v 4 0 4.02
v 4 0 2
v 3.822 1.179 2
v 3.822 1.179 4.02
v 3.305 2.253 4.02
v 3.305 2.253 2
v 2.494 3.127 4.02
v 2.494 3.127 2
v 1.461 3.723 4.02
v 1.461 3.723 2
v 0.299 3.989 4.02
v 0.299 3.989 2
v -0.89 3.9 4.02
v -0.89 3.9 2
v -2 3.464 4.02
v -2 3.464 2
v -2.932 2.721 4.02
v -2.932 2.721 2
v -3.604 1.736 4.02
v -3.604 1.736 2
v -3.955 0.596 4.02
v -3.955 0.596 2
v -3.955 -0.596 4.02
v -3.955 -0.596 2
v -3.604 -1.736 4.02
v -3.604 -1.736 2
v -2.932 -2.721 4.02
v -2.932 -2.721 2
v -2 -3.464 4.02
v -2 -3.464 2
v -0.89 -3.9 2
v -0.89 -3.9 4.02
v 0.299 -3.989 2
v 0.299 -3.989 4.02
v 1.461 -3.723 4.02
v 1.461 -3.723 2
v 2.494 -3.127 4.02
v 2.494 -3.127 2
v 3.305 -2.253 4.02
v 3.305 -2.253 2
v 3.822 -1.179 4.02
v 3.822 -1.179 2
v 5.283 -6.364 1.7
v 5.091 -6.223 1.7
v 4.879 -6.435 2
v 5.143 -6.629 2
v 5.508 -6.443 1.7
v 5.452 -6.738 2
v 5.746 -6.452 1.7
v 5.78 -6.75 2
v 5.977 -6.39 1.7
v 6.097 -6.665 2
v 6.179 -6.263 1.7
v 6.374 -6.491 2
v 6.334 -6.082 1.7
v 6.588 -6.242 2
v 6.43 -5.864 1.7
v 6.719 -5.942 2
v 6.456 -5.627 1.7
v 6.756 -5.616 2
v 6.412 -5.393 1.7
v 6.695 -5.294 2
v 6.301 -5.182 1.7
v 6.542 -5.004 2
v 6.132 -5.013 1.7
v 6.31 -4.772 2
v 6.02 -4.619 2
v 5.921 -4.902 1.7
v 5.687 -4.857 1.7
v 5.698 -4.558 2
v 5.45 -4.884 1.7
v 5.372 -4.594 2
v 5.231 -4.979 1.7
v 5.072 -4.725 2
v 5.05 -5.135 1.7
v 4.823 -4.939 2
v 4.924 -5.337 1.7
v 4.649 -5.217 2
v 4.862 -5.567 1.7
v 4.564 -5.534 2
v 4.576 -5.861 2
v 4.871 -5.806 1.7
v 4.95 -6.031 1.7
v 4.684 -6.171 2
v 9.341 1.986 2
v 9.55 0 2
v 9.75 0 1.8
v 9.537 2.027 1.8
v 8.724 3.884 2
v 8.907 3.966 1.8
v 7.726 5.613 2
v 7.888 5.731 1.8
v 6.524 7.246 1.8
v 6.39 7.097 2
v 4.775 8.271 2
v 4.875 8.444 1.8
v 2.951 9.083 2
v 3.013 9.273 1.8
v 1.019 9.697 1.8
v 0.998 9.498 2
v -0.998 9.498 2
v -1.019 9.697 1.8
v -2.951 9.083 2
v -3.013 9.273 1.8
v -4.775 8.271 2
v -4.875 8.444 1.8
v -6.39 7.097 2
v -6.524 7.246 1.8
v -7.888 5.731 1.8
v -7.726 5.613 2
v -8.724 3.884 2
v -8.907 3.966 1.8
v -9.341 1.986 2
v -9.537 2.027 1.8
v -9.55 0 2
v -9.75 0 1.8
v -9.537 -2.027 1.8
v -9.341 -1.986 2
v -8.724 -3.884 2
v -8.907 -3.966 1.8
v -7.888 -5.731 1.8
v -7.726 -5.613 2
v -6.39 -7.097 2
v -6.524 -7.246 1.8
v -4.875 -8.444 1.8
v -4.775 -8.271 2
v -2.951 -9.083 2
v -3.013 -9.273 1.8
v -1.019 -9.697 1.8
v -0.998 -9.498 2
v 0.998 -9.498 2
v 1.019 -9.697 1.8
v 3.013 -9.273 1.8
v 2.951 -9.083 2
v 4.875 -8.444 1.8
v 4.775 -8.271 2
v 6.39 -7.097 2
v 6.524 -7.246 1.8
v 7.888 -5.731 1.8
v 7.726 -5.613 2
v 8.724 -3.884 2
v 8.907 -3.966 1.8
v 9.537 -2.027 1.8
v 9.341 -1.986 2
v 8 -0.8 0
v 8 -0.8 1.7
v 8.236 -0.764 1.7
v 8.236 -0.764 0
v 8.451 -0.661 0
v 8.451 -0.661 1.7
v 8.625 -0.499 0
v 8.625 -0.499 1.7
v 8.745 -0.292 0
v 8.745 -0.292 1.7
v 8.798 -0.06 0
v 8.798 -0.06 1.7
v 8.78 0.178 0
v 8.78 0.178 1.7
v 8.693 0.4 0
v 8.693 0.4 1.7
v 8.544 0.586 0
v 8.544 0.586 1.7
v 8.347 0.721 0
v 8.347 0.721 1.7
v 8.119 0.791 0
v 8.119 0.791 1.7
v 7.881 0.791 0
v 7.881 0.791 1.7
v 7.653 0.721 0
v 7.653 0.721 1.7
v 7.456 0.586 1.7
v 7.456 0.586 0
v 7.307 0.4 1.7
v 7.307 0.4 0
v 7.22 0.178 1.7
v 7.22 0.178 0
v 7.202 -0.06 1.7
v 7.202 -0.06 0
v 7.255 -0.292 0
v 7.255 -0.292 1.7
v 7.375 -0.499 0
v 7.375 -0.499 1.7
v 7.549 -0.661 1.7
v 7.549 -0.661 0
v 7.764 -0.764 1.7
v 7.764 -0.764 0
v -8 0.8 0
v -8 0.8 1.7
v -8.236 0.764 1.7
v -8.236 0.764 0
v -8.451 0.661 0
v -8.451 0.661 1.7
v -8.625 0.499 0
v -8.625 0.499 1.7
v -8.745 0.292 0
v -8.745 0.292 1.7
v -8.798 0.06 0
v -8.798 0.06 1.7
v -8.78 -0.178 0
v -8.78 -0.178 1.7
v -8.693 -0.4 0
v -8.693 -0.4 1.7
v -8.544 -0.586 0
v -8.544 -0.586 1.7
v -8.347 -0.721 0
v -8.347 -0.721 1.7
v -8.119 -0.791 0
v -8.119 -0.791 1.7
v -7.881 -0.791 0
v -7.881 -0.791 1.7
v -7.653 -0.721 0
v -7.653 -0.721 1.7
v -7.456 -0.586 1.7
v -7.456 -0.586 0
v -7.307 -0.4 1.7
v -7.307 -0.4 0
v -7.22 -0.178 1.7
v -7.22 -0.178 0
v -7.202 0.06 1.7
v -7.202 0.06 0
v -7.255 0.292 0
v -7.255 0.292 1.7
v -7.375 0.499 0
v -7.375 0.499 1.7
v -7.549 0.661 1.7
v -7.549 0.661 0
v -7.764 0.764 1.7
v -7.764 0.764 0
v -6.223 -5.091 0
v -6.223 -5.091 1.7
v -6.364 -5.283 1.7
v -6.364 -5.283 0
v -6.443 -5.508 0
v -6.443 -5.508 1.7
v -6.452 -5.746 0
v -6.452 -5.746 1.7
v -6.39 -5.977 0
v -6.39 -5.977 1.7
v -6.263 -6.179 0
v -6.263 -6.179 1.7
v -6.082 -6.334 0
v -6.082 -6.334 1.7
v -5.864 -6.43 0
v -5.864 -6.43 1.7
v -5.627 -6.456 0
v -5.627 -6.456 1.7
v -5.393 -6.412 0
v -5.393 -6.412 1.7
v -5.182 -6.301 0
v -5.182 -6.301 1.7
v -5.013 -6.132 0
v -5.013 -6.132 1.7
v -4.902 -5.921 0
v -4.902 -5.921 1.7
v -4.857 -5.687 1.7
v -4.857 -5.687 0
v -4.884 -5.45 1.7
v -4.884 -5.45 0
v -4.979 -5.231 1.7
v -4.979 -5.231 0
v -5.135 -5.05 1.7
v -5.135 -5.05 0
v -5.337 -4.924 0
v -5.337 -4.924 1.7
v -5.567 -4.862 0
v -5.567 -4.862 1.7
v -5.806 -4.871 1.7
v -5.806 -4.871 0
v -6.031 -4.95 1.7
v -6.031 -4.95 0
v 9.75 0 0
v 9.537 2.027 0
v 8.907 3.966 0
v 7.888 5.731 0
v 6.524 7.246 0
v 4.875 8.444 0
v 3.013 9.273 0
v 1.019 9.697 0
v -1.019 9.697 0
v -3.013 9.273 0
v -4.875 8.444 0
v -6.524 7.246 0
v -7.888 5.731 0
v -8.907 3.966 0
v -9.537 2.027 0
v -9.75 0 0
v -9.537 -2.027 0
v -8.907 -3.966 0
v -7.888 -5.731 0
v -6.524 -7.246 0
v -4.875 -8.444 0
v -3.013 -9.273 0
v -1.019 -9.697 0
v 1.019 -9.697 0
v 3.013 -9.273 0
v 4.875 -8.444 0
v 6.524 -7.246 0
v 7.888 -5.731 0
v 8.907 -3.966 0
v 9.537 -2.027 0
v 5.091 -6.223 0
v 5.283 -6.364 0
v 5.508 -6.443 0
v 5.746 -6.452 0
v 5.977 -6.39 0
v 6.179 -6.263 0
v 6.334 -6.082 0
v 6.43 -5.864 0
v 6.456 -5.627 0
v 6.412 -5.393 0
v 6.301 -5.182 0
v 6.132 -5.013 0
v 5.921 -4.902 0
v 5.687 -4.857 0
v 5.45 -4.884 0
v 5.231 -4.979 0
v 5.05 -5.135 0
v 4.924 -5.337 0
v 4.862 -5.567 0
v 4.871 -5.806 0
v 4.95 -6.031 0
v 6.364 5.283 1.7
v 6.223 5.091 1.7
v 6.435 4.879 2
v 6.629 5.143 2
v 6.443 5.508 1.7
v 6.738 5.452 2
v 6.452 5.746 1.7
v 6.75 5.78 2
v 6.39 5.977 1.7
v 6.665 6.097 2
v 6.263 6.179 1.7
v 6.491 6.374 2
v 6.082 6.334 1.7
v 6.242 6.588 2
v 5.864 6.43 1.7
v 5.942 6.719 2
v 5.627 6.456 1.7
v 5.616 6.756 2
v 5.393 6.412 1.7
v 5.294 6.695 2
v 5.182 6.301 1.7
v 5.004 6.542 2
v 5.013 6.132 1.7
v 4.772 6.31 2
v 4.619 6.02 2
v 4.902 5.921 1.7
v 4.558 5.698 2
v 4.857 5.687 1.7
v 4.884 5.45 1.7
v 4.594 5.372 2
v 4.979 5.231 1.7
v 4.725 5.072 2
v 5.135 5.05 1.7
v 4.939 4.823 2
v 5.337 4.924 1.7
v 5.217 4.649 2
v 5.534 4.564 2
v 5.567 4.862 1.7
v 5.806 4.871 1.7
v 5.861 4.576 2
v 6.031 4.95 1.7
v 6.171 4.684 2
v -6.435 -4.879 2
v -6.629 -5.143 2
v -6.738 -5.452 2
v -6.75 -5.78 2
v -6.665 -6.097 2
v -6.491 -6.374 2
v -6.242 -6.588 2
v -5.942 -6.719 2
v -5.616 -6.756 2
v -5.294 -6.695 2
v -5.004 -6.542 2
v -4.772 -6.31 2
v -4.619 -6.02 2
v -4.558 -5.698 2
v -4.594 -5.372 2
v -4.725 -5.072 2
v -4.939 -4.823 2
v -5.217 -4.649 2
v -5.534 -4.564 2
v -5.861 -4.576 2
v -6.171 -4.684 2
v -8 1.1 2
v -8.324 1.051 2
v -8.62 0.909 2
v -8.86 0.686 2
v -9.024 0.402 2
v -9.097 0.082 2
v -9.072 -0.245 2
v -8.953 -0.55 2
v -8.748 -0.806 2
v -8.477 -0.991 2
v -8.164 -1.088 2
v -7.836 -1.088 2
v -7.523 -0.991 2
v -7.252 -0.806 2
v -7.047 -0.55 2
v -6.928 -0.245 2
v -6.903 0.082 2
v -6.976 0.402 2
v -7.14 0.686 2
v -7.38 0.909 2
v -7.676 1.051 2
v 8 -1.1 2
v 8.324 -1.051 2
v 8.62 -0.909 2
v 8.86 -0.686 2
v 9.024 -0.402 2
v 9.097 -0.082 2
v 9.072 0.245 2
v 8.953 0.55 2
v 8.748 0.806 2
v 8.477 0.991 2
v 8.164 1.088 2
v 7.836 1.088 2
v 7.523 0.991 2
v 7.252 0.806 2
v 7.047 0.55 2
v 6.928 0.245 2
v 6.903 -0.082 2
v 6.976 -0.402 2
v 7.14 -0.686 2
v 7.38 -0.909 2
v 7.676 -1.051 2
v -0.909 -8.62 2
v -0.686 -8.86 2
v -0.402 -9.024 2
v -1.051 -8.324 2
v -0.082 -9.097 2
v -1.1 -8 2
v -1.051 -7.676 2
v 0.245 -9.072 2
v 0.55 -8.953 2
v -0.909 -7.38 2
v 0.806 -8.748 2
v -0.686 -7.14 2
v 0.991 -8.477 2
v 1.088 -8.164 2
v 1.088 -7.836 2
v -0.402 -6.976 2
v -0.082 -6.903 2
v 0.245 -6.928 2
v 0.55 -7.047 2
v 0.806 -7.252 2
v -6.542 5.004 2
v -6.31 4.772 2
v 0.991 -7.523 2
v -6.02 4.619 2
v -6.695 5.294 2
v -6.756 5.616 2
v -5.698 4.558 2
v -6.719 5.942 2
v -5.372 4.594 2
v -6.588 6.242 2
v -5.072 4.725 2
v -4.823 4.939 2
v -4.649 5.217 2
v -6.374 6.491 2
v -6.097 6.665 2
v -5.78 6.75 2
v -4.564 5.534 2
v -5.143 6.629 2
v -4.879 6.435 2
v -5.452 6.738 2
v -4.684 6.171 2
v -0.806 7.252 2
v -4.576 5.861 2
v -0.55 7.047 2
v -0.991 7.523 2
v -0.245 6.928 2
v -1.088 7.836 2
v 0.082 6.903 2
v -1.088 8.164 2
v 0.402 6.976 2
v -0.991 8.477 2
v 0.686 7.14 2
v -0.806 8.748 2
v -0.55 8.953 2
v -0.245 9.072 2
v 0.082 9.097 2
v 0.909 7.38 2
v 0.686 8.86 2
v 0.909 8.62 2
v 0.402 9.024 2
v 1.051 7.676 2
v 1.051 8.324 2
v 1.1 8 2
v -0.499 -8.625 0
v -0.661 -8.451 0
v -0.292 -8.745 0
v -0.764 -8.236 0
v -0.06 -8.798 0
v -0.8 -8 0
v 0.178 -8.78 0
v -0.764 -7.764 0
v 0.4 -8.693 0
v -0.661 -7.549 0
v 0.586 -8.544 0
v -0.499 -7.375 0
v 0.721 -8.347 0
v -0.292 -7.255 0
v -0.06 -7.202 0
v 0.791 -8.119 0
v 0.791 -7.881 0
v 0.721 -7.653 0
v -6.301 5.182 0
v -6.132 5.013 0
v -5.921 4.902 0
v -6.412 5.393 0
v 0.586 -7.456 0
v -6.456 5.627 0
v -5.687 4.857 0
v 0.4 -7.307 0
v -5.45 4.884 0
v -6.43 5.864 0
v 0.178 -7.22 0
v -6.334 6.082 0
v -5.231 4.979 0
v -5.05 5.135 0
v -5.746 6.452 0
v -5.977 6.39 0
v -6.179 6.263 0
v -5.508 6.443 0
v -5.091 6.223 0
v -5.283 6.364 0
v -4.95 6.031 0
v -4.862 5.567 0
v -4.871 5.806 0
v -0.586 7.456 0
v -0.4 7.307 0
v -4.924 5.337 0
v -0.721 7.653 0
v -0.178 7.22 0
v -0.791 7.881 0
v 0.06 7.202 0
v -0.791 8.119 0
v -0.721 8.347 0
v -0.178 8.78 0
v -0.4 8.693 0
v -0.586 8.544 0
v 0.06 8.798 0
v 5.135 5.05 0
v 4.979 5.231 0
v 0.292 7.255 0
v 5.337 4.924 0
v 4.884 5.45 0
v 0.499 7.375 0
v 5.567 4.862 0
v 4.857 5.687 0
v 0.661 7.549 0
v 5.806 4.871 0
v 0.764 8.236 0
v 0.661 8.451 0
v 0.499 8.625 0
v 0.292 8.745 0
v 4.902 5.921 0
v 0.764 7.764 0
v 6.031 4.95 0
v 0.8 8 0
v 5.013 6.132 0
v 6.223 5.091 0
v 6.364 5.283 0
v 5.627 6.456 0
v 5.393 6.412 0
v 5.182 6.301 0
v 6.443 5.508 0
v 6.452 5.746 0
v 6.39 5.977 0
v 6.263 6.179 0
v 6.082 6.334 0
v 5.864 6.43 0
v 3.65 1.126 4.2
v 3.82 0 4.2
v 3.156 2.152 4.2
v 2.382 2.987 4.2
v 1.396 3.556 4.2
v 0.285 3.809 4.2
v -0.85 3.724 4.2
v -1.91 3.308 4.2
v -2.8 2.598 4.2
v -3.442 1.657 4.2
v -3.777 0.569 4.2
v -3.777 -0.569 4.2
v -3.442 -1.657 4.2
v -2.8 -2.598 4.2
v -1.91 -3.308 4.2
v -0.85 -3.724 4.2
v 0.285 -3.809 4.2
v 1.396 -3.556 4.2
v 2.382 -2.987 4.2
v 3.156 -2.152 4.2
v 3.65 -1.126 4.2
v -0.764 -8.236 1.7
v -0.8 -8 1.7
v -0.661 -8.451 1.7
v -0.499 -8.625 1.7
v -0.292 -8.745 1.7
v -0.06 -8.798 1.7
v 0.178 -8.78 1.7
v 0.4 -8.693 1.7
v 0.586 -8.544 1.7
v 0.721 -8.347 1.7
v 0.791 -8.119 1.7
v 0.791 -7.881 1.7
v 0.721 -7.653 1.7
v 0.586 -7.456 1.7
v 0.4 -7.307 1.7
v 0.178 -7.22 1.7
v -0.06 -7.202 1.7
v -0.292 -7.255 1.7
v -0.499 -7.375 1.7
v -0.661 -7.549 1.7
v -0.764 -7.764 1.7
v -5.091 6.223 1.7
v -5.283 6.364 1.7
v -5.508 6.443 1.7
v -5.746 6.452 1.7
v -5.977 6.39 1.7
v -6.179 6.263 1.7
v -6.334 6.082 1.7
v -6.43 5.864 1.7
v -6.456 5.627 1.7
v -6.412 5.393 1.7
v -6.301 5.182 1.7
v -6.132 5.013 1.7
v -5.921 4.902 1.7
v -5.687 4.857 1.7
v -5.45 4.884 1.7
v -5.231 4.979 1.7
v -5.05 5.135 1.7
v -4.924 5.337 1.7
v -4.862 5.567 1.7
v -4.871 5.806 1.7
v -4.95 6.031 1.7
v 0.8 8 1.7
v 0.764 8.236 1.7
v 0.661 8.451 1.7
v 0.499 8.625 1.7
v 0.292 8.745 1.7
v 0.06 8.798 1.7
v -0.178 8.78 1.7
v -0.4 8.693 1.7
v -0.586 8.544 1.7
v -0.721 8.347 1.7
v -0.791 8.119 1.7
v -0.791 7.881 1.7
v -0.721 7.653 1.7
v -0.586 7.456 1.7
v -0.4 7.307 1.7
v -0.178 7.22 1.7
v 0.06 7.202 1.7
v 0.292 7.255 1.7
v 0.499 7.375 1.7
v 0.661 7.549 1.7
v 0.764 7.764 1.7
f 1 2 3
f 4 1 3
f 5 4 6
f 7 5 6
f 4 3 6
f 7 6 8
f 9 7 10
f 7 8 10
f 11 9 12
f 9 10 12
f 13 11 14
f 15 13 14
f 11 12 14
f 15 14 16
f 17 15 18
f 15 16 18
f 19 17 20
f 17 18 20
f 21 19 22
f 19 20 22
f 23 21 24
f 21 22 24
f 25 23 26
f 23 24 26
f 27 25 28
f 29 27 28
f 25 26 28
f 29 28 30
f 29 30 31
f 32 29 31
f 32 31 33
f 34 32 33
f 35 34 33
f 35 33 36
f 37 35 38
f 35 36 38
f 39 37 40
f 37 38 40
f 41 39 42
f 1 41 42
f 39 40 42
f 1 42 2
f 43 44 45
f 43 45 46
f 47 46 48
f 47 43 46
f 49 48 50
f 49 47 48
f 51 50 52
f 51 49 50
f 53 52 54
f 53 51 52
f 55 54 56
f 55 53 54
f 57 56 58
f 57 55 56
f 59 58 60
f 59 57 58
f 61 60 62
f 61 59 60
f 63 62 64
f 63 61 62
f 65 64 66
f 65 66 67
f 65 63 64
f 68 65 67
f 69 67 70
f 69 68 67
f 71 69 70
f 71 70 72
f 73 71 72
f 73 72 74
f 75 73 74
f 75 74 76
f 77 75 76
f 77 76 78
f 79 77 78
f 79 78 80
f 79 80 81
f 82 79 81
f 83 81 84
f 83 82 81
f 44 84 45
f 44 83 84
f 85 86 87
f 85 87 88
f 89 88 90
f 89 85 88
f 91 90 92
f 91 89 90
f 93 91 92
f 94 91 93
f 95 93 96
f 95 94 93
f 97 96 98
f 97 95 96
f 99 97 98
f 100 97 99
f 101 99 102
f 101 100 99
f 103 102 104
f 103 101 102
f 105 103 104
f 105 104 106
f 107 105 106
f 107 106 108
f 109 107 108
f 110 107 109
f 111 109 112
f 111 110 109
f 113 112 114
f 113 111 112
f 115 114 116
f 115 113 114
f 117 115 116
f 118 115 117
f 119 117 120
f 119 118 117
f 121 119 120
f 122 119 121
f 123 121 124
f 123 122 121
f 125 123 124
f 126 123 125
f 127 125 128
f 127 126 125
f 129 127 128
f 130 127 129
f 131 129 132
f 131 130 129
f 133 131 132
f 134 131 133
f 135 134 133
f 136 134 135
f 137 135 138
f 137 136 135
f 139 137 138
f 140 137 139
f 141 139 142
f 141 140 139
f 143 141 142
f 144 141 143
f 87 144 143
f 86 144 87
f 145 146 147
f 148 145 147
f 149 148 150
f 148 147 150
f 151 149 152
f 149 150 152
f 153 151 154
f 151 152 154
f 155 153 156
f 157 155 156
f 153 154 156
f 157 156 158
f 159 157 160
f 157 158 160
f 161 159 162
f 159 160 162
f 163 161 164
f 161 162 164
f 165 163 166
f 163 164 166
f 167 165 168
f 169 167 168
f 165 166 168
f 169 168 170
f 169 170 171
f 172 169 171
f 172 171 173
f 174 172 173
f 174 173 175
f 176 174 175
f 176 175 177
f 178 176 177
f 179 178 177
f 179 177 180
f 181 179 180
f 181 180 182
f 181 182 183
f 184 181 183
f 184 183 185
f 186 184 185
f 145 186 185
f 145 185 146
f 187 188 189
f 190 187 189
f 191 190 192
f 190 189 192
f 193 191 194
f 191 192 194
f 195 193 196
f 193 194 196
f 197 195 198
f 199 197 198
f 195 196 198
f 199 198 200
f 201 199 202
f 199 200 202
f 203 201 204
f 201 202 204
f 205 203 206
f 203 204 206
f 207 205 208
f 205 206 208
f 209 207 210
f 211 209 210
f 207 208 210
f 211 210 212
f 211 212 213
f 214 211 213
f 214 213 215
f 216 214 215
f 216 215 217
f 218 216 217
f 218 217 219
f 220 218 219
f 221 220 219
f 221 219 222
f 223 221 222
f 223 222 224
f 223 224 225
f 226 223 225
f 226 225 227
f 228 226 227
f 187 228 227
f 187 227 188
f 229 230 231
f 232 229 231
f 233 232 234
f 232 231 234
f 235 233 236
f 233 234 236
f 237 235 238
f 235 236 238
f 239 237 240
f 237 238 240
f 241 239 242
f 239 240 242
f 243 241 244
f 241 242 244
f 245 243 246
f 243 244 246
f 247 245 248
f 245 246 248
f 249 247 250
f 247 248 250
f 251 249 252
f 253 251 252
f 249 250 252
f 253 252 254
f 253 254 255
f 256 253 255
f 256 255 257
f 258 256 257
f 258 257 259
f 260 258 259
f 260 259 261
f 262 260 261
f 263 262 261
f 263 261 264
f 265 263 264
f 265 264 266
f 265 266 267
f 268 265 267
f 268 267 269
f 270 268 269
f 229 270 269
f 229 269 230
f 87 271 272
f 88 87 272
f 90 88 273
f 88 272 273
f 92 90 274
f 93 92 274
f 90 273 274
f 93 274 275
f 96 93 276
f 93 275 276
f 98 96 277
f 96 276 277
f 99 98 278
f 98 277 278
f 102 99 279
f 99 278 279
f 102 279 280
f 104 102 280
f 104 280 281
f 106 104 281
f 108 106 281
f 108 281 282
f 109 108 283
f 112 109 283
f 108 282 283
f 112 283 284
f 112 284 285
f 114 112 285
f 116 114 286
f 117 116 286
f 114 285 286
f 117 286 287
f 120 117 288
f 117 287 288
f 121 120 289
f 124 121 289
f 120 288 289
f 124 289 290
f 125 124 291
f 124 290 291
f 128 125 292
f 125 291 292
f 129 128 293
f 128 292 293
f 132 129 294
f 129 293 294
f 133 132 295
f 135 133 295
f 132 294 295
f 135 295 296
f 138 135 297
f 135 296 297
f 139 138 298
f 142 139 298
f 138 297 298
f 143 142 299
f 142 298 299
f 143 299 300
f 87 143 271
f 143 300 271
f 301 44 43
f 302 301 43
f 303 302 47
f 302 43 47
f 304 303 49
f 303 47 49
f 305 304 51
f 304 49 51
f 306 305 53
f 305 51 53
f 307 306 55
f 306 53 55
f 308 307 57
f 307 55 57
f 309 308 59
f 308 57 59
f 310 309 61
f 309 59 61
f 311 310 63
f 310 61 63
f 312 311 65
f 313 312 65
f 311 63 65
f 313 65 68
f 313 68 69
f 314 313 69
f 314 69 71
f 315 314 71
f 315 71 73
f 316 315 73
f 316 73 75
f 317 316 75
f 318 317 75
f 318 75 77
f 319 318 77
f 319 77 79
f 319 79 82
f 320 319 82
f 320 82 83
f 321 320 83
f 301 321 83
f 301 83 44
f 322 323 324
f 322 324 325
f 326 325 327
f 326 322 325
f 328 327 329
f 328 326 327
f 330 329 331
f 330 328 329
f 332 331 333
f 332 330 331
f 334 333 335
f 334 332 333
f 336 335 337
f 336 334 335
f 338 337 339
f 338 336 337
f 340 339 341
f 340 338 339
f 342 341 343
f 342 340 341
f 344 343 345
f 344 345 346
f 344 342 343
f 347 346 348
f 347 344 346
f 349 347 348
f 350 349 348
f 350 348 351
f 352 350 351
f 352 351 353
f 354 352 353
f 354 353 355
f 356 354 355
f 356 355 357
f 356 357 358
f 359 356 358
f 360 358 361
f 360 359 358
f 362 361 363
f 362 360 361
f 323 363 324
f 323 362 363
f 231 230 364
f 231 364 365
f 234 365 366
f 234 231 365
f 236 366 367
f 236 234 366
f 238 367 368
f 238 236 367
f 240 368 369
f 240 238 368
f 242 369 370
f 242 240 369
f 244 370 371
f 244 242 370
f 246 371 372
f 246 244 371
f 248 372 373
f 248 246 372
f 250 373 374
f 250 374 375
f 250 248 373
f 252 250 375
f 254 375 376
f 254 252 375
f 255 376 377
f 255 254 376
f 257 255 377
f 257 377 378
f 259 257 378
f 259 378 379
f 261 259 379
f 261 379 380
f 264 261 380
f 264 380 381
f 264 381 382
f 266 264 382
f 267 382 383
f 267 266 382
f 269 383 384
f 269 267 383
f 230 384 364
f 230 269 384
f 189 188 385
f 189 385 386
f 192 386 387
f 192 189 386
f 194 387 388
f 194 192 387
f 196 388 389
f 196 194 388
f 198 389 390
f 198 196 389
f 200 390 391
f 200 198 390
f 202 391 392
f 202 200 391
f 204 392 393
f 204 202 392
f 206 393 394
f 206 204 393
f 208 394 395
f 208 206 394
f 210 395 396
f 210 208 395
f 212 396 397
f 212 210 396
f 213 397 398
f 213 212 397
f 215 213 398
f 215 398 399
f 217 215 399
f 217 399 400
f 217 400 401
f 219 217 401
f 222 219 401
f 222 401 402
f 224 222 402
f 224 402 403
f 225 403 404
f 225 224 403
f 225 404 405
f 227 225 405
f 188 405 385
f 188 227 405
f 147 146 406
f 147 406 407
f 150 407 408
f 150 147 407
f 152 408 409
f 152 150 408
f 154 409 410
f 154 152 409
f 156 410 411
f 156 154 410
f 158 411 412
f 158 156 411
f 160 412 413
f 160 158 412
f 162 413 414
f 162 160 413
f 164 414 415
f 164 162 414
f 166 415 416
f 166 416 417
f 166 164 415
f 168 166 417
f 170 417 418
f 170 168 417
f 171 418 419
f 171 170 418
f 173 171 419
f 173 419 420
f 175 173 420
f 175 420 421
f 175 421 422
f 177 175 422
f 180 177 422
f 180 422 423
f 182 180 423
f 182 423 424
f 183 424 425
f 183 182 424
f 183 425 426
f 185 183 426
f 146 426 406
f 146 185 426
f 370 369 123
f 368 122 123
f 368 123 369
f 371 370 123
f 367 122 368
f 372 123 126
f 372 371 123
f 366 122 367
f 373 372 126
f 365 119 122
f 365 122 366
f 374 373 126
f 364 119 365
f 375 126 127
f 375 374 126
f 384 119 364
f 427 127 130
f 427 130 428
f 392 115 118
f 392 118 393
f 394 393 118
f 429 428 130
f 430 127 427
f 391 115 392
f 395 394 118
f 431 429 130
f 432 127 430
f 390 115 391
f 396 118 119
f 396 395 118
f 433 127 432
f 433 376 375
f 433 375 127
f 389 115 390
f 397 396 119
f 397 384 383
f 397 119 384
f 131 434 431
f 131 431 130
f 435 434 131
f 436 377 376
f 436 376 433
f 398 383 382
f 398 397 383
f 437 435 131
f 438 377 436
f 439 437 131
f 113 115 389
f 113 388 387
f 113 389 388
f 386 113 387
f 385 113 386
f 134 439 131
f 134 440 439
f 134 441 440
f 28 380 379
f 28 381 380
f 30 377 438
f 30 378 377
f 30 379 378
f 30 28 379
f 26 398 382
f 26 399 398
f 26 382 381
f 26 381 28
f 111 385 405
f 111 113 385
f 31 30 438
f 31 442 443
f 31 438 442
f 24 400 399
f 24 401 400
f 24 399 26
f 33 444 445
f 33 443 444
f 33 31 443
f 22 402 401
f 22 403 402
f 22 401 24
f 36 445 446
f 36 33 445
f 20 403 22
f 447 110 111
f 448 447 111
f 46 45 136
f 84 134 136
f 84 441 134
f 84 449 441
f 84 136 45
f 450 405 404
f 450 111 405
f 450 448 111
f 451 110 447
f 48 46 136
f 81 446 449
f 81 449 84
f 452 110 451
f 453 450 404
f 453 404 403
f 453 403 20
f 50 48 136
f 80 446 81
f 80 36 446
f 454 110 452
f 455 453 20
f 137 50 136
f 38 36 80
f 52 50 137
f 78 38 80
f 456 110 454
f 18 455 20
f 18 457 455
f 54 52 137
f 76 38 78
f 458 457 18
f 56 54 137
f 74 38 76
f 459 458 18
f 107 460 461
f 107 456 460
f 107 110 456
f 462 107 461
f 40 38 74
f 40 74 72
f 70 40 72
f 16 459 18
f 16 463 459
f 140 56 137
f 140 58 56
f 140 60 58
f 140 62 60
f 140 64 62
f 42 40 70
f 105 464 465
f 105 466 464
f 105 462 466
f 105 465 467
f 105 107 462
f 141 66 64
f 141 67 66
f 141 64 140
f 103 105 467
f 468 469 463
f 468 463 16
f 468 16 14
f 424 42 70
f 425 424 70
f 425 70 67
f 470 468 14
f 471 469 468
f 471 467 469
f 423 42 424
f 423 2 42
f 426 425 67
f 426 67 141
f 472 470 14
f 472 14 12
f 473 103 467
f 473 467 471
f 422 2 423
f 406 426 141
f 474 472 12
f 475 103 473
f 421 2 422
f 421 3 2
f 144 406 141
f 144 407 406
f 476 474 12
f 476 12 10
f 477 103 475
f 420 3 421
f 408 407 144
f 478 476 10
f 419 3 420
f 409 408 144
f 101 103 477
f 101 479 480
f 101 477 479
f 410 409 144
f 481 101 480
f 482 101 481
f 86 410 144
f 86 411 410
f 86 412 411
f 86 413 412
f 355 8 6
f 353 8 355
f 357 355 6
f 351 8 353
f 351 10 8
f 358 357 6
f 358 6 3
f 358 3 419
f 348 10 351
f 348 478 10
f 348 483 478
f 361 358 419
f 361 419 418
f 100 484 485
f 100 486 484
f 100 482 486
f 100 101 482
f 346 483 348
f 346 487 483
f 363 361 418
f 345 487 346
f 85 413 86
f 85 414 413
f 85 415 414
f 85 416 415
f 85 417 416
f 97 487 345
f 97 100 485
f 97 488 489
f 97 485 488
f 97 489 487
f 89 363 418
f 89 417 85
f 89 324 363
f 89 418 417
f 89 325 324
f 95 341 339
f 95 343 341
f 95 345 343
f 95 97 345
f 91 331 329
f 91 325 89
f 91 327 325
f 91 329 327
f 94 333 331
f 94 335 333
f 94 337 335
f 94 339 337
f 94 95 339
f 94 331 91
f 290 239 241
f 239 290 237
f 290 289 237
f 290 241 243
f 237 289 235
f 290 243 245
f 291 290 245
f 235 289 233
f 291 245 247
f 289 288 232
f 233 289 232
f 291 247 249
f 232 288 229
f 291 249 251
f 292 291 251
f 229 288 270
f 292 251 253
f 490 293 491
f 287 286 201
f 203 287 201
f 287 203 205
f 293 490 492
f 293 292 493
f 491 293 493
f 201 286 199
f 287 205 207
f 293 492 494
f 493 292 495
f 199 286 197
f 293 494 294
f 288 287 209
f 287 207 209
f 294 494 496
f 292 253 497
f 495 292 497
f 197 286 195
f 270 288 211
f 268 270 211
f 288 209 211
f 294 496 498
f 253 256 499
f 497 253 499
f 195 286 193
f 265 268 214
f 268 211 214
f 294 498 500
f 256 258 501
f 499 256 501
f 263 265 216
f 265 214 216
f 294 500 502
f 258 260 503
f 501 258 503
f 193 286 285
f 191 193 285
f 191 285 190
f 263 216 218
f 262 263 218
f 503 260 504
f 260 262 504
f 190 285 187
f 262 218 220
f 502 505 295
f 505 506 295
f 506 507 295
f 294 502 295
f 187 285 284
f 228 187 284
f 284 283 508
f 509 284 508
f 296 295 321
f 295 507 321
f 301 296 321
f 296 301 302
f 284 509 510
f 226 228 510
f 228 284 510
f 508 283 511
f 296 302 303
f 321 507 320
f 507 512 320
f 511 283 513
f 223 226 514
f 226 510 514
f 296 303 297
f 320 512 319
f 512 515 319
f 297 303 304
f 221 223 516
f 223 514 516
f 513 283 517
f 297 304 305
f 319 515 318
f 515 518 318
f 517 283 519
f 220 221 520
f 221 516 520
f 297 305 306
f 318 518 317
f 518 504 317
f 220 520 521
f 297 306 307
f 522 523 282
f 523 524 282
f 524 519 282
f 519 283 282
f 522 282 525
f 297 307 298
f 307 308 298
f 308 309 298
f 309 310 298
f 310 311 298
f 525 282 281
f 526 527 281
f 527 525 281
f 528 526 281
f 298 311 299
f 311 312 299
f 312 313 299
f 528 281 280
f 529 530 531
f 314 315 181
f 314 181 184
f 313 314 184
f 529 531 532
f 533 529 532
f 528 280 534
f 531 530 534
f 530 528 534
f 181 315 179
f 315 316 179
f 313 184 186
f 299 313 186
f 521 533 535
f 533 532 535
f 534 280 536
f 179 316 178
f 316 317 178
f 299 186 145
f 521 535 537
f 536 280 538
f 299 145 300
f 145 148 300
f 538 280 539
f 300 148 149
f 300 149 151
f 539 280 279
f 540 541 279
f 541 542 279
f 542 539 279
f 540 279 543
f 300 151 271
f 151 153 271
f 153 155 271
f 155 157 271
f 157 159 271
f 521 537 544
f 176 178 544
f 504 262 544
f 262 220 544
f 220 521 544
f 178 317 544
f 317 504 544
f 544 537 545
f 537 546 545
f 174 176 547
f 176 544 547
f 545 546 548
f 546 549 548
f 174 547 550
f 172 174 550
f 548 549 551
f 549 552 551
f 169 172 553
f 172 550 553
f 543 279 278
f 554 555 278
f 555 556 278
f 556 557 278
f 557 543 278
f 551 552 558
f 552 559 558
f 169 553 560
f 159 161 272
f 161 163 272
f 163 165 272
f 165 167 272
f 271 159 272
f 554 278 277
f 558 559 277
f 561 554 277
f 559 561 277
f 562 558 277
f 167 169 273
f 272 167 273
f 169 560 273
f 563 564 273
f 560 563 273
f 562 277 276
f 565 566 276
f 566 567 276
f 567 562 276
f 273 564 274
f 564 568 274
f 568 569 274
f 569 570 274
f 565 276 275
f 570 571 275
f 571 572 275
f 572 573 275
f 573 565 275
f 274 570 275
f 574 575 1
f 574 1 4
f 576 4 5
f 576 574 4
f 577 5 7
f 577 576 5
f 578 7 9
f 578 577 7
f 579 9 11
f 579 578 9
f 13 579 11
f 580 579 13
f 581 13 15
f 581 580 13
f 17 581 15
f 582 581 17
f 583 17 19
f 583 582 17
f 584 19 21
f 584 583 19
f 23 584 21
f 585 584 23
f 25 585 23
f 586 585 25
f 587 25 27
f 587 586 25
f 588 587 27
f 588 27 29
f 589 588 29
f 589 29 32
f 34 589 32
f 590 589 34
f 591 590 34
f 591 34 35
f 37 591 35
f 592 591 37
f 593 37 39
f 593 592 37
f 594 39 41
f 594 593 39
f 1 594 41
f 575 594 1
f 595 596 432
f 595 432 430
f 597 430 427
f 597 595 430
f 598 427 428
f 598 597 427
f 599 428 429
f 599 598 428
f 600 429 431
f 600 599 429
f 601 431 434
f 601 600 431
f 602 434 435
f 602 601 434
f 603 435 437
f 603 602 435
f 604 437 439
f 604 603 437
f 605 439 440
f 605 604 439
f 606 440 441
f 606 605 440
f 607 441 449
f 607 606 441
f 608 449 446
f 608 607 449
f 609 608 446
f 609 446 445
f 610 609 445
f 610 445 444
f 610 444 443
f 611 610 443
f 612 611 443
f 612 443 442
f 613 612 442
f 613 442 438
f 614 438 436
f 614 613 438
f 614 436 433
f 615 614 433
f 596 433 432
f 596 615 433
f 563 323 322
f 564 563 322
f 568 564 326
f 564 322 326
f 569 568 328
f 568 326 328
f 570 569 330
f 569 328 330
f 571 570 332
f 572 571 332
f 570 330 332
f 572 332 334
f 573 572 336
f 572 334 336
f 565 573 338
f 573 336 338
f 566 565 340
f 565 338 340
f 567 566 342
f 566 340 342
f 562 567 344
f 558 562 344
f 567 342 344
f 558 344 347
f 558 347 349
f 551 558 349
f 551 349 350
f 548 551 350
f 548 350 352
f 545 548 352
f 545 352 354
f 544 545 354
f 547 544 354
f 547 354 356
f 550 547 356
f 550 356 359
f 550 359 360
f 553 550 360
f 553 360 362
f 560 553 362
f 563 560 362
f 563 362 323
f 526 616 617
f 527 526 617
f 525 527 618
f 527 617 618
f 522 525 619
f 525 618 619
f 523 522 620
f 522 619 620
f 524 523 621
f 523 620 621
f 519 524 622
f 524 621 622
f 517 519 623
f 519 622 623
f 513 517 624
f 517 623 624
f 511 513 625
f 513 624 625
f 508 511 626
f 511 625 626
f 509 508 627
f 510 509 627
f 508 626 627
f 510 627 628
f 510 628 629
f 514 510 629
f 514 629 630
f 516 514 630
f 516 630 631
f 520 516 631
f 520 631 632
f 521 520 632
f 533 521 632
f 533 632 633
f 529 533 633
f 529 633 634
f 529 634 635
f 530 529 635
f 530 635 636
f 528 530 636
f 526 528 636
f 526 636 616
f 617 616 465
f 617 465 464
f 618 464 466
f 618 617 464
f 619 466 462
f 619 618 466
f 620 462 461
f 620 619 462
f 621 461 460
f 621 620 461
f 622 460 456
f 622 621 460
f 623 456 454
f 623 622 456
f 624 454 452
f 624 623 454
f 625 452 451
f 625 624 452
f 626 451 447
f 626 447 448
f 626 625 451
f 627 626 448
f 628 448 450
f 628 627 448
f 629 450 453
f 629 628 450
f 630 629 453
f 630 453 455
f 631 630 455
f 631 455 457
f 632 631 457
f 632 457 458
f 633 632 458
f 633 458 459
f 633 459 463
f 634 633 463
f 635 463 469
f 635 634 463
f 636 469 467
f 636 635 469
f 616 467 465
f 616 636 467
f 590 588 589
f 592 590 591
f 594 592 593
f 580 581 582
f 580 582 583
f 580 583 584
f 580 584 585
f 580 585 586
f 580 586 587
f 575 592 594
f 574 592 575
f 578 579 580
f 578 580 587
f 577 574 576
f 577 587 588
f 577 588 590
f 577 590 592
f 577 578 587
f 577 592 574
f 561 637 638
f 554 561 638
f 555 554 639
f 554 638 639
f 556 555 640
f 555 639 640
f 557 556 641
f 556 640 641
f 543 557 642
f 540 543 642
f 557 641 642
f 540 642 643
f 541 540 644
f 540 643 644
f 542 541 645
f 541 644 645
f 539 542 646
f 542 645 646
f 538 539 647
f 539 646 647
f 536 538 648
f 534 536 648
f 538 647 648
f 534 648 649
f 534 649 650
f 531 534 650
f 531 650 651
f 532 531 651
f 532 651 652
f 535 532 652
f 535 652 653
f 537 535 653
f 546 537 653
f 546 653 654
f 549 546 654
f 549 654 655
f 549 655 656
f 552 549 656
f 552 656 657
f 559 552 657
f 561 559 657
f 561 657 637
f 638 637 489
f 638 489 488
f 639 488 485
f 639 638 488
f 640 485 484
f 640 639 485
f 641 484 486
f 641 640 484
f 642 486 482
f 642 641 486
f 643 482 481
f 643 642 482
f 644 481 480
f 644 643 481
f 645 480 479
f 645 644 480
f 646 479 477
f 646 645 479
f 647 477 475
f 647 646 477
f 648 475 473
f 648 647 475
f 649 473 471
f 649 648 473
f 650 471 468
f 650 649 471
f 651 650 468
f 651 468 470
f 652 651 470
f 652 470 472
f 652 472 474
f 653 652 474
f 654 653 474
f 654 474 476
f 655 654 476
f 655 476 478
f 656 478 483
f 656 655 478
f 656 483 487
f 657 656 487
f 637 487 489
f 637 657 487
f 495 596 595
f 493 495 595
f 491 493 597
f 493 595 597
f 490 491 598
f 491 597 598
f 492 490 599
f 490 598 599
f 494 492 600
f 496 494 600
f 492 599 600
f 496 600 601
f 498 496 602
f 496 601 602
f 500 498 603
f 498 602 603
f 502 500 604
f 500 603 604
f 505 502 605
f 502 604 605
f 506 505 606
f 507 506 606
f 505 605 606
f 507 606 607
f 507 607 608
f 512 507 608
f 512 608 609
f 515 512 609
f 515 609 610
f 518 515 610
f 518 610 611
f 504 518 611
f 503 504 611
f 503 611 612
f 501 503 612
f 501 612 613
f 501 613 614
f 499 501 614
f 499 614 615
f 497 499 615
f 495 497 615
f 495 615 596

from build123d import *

# Parameters (mm, degrees)
SKETCH1_R                    = 9.75
BOSS_EXTRUDE1_DEPTH          = 2
SKETCH2_R                    = 4
BOSS_EXTRUDE2_DEPTH          = 2.2
CHAMFER5_SIZE                = 0.2
CHAMFER6_SIZE                = 0.18
SKETCH8_R                    = 0.8
CUT_EXTRUDE1_DEPTH           = 14.962986787
CHAMFER7_SIZE                = 0.3
CIRPATTERN4_COUNT            = 8
CHAMFER7_OF_CIRPATTERN4_SIZE = 0.3


with BuildPart() as part:
    # Sketch1 → Boss-Extrude1 (new body)
    with BuildSketch(Plane.XY):
        Circle(SKETCH1_R)
    extrude(amount=BOSS_EXTRUDE1_DEPTH)

    # Sketch2 → Boss-Extrude2 (add)
    with BuildSketch(Plane.XY.offset(2)):
        Circle(SKETCH2_R)
    extrude(amount=BOSS_EXTRUDE2_DEPTH)

    # Chamfer5
    chamfer5_edges = [part.edges().sort_by_distance(p)[0] for p in [
        (-9.75, 0, 2),
    ]]
    chamfer(chamfer5_edges, length=CHAMFER5_SIZE)

    # Chamfer6
    chamfer6_edges = [part.edges().sort_by_distance(p)[0] for p in [
        (-4, 0, 4.2),
    ]]
    chamfer(chamfer6_edges, length=CHAMFER6_SIZE)

    # Sketch8 → Cut-Extrude1 (cut, through all)
    with BuildSketch(Plane.XY.offset(2)):
        with Locations((0, 8)):
            Circle(SKETCH8_R)
    cut_extrude1 = extrude(amount=-CUT_EXTRUDE1_DEPTH, mode=Mode.SUBTRACT)

    # Chamfer7
    chamfer7_edges = [part.edges().sort_by_distance(p)[0] for p in [
        (-0.8, 8, 2),
    ]]
    chamfer(chamfer7_edges, length=CHAMFER7_SIZE)

    # CirPattern4: Cut-Extrude1 ×8 about axis
    cirpattern4_axis = Axis((0, 0, 0), (0, 0, 1))
    for i in range(1, CIRPATTERN4_COUNT):
        add(cut_extrude1.rotate(cirpattern4_axis, i * 360 / CIRPATTERN4_COUNT), mode=Mode.SUBTRACT)

    # Chamfer7 of CirPattern4
    chamfer7_of_cirpattern4_edges = [part.edges().sort_by_distance(p)[0] for p in [
        (-6.222539674, 5.091168825, 2),
        (-8, -0.8, 2),
        (-5.091168825, -6.222539674, 2),
        (0.8, -8, 2),
        (6.222539674, -5.091168825, 2),
        (8, 0.8, 2),
        (5.091168825, 6.222539674, 2),
    ]]
    chamfer(chamfer7_of_cirpattern4_edges, length=CHAMFER7_OF_CIRPATTERN4_SIZE)


solid = part.part
